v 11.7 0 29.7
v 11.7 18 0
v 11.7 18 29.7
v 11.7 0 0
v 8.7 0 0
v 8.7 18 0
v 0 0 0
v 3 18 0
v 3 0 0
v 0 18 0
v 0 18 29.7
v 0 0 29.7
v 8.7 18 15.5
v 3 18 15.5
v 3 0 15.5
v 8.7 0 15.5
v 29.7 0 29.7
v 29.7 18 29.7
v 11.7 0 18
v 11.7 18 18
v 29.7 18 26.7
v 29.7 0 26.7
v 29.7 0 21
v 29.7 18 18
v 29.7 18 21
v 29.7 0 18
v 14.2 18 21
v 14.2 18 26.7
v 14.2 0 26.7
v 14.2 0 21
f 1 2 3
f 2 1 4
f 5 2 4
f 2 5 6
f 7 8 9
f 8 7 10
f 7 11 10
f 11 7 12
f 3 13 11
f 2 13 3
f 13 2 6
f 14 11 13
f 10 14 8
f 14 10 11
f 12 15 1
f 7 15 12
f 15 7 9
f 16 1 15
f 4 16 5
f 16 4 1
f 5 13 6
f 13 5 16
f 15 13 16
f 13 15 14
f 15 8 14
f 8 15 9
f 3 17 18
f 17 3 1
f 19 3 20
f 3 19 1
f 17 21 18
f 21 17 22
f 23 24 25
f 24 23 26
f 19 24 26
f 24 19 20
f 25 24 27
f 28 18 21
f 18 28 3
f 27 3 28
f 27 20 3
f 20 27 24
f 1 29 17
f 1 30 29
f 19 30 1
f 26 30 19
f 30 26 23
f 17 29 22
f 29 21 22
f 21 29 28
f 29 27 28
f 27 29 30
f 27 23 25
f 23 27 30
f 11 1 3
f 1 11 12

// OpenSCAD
union () {
  difference () {
    cube ([11.7, 18, 18]);
    translate ([3, -0.5, -0.5]) {
      cube ([5.7, 19, 16]);
    }
  }
  translate ([29.7, 0, 18]) {
    rotate (a=-90.0, v=[0, 1, 0]) {
      difference () {
        cube ([11.7, 18, 18]);
        translate ([3, -0.5, -0.5]) {
          cube ([5.7, 19, 16]);
        }
      }
    }
  }
  translate ([0, 0, 18]) {
    cube ([11.7, 18, 11.7]);
  }
}
